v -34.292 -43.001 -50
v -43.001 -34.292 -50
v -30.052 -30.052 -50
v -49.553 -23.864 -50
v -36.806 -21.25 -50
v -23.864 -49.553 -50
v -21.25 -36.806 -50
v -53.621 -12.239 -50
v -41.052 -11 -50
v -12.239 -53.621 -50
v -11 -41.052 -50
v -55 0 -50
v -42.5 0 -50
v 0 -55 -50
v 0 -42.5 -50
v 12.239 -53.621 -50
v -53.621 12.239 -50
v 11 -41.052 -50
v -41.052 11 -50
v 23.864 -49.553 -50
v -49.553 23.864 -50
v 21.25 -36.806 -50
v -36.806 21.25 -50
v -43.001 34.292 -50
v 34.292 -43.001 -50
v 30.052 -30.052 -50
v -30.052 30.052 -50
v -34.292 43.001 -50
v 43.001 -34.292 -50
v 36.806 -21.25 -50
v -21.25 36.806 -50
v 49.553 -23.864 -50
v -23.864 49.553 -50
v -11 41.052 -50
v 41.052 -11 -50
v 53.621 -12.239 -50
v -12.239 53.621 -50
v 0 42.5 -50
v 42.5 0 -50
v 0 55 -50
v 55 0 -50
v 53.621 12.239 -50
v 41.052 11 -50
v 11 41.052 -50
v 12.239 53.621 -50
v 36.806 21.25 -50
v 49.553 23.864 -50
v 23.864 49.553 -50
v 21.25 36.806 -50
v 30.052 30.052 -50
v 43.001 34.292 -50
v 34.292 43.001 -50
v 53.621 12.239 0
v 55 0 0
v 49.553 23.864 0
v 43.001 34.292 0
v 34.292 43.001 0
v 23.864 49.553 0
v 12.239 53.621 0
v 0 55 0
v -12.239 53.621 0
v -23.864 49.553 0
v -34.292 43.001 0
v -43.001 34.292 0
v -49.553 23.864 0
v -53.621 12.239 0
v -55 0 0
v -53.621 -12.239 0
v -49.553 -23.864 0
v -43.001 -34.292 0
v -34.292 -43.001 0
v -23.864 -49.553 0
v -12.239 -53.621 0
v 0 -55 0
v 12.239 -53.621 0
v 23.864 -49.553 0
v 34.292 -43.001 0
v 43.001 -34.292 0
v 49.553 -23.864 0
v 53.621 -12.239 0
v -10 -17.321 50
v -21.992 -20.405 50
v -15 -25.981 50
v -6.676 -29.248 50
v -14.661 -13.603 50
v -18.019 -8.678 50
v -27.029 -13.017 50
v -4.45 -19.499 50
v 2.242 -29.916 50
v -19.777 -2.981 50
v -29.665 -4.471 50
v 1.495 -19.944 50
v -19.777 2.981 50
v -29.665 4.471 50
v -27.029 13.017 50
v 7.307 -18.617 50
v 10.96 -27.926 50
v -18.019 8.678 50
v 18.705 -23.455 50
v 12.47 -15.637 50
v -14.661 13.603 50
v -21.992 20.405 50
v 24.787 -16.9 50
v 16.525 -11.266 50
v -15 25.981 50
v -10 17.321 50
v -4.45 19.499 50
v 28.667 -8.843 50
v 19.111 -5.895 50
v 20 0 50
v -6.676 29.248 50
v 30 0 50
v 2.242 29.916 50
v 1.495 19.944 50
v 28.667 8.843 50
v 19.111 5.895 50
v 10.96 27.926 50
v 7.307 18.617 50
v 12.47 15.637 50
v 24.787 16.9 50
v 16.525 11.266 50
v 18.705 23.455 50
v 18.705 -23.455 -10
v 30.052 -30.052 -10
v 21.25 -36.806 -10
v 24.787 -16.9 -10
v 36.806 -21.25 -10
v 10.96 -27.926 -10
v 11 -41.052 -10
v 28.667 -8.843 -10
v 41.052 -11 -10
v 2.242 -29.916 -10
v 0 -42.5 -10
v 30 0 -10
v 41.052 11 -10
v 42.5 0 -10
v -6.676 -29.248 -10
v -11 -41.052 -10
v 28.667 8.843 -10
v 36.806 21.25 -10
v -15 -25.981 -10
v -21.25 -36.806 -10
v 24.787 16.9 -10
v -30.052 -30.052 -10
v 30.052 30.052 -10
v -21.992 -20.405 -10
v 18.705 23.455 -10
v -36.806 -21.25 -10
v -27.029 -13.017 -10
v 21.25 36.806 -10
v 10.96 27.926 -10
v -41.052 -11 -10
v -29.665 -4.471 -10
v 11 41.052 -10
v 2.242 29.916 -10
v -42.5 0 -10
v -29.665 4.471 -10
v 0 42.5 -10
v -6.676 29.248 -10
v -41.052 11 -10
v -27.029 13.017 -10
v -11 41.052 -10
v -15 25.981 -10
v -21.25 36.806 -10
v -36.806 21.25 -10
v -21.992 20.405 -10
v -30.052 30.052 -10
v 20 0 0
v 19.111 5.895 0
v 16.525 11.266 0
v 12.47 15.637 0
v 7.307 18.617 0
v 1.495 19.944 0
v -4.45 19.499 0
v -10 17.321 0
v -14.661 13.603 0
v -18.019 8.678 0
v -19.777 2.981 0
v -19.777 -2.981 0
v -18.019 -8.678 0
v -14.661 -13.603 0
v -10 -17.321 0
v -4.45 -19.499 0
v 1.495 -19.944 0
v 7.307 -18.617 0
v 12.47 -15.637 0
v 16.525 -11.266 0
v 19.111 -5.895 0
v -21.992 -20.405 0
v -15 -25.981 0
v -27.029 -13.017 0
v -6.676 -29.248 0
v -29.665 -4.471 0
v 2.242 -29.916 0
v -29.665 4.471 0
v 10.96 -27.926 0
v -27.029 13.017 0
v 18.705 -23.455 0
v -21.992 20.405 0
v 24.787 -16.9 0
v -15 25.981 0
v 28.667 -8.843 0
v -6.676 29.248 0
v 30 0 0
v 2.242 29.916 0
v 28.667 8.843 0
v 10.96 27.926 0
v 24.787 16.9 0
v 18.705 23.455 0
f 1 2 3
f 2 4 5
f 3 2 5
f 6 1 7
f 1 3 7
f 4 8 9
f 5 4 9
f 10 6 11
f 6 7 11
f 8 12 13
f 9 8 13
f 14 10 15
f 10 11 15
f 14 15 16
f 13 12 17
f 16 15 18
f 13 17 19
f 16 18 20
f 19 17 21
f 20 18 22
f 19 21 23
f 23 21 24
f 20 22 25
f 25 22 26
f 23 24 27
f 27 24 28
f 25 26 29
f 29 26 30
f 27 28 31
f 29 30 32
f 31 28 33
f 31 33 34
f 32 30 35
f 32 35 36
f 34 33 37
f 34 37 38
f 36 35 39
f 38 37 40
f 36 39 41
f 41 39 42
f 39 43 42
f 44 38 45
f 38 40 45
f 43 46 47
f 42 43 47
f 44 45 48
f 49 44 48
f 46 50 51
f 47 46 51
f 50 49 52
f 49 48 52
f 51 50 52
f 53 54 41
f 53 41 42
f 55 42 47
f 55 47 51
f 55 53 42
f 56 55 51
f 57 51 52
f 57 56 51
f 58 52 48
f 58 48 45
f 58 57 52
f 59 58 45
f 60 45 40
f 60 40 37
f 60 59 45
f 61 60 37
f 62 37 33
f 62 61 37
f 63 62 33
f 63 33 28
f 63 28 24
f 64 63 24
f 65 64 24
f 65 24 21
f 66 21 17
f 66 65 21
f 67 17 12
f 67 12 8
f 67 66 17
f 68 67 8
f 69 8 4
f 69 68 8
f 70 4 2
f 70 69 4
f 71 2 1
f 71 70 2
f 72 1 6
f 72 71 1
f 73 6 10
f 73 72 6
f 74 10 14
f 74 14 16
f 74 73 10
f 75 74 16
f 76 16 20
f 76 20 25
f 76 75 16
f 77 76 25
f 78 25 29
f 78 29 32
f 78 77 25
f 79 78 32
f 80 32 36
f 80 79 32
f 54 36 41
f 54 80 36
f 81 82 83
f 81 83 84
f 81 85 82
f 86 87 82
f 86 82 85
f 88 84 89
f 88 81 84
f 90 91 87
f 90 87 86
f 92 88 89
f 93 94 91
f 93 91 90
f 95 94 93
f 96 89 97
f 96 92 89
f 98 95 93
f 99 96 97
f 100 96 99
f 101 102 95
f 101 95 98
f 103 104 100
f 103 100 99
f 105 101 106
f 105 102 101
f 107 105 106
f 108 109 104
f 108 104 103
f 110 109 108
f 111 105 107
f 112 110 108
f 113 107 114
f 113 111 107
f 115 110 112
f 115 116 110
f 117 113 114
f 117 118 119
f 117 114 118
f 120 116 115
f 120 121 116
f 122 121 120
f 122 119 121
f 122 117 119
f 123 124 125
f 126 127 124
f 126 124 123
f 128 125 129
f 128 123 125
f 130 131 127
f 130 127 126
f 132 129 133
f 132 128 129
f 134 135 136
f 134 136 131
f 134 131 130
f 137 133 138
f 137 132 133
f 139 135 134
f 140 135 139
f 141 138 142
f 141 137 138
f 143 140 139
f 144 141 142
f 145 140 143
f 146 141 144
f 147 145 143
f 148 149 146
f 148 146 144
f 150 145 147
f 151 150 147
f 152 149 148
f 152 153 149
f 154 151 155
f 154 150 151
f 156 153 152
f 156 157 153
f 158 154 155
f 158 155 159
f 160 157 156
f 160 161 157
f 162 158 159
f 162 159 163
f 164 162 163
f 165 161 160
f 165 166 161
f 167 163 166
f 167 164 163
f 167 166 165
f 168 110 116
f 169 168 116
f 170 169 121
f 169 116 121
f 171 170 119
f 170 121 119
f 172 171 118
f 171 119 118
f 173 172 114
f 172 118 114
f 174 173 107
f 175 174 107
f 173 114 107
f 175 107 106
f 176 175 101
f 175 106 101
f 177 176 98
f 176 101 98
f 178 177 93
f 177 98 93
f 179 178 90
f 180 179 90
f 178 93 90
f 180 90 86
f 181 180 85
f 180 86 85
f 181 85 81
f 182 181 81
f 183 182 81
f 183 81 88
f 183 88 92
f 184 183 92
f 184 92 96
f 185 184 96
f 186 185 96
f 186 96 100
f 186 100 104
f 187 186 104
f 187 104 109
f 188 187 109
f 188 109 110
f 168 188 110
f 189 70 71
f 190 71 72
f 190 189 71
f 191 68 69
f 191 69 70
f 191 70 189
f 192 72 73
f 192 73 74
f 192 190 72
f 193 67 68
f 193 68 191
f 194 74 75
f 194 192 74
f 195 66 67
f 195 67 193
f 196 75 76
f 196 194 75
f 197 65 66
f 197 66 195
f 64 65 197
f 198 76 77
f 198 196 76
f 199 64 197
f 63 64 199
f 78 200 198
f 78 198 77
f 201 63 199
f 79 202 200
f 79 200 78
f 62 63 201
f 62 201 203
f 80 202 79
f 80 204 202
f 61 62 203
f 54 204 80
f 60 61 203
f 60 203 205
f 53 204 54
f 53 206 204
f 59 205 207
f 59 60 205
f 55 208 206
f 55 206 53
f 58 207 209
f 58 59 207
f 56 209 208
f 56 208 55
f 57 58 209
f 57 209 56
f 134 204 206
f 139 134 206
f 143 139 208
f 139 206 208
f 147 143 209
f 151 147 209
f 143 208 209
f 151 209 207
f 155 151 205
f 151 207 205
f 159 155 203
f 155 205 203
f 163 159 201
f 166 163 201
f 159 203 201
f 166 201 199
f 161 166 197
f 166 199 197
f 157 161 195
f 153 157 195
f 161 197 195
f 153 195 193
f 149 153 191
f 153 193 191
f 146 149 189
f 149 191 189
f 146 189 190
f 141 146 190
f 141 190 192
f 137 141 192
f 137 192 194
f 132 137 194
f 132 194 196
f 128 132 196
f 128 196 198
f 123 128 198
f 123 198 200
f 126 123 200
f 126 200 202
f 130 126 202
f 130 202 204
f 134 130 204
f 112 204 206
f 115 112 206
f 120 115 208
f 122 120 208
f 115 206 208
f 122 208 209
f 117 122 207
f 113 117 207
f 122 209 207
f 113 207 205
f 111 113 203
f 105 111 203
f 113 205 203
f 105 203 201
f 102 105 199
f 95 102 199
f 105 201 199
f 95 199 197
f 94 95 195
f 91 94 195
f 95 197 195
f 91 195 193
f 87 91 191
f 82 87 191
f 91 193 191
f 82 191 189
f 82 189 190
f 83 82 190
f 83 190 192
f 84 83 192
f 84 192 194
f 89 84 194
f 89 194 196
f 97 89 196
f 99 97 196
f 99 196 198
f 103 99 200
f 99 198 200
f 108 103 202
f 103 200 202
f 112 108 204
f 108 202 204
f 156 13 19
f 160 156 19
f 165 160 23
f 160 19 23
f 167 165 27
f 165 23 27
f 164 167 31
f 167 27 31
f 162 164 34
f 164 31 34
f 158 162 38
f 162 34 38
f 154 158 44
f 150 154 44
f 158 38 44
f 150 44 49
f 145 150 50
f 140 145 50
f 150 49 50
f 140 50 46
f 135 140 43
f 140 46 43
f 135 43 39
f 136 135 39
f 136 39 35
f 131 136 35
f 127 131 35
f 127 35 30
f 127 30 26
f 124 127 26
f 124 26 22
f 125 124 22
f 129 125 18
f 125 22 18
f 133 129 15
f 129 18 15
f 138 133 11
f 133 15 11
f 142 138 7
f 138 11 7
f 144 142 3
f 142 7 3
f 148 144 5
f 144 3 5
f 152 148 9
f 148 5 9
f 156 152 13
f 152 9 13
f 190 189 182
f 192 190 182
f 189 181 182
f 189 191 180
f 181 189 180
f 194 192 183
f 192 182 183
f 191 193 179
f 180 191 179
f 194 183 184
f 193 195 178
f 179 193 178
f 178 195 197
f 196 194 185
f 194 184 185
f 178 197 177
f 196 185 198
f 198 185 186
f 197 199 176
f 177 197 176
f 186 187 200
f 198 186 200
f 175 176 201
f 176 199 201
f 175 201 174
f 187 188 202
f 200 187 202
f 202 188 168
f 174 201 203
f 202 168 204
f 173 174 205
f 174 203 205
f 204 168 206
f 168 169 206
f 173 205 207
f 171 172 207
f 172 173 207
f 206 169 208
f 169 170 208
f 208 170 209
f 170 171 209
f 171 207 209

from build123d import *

# Parameters (mm, degrees)
SKETCH1_R           = 30
BOSS_EXTRUDE1_DEPTH = 50
SKETCH1_4_R         = 55
SKETCH1_4_R_2       = 30
BOSS_EXTRUDE2_DEPTH = 50
SKETCH2_R           = 20
CUT_EXTRUDE1_DEPTH  = 127.688594593
SKETCH3_R           = 42.5
CUT_EXTRUDE2_DEPTH  = 40


with BuildPart() as part:
    # Sketch1 → Boss-Extrude1 (new body)
    with BuildSketch(Plane.XY):
        Circle(SKETCH1_R)
    extrude(amount=BOSS_EXTRUDE1_DEPTH)

    # Sketch2 → Cut-Extrude1 (cut, through all)
    with BuildSketch(Plane.XY.offset(50)):
        Circle(SKETCH2_R)
    extrude(amount=-CUT_EXTRUDE1_DEPTH, mode=Mode.SUBTRACT)


with BuildPart() as body_2:
    # Sketch1<4> → Boss-Extrude2 (new body)
    with BuildSketch(Plane.XY):
        Circle(SKETCH1_4_R)
        Circle(SKETCH1_4_R_2, mode=Mode.SUBTRACT)
    extrude(amount=-BOSS_EXTRUDE2_DEPTH)

    # Sketch3 → Cut-Extrude2 (cut)
    with BuildSketch(Plane(origin=(0, 0, -50), x_dir=(-1, 0, 0), z_dir=(0, 0, -1))):
        Circle(SKETCH3_R)
    extrude(amount=-CUT_EXTRUDE2_DEPTH, mode=Mode.SUBTRACT)


solid = Compound([part.part, body_2.part])
